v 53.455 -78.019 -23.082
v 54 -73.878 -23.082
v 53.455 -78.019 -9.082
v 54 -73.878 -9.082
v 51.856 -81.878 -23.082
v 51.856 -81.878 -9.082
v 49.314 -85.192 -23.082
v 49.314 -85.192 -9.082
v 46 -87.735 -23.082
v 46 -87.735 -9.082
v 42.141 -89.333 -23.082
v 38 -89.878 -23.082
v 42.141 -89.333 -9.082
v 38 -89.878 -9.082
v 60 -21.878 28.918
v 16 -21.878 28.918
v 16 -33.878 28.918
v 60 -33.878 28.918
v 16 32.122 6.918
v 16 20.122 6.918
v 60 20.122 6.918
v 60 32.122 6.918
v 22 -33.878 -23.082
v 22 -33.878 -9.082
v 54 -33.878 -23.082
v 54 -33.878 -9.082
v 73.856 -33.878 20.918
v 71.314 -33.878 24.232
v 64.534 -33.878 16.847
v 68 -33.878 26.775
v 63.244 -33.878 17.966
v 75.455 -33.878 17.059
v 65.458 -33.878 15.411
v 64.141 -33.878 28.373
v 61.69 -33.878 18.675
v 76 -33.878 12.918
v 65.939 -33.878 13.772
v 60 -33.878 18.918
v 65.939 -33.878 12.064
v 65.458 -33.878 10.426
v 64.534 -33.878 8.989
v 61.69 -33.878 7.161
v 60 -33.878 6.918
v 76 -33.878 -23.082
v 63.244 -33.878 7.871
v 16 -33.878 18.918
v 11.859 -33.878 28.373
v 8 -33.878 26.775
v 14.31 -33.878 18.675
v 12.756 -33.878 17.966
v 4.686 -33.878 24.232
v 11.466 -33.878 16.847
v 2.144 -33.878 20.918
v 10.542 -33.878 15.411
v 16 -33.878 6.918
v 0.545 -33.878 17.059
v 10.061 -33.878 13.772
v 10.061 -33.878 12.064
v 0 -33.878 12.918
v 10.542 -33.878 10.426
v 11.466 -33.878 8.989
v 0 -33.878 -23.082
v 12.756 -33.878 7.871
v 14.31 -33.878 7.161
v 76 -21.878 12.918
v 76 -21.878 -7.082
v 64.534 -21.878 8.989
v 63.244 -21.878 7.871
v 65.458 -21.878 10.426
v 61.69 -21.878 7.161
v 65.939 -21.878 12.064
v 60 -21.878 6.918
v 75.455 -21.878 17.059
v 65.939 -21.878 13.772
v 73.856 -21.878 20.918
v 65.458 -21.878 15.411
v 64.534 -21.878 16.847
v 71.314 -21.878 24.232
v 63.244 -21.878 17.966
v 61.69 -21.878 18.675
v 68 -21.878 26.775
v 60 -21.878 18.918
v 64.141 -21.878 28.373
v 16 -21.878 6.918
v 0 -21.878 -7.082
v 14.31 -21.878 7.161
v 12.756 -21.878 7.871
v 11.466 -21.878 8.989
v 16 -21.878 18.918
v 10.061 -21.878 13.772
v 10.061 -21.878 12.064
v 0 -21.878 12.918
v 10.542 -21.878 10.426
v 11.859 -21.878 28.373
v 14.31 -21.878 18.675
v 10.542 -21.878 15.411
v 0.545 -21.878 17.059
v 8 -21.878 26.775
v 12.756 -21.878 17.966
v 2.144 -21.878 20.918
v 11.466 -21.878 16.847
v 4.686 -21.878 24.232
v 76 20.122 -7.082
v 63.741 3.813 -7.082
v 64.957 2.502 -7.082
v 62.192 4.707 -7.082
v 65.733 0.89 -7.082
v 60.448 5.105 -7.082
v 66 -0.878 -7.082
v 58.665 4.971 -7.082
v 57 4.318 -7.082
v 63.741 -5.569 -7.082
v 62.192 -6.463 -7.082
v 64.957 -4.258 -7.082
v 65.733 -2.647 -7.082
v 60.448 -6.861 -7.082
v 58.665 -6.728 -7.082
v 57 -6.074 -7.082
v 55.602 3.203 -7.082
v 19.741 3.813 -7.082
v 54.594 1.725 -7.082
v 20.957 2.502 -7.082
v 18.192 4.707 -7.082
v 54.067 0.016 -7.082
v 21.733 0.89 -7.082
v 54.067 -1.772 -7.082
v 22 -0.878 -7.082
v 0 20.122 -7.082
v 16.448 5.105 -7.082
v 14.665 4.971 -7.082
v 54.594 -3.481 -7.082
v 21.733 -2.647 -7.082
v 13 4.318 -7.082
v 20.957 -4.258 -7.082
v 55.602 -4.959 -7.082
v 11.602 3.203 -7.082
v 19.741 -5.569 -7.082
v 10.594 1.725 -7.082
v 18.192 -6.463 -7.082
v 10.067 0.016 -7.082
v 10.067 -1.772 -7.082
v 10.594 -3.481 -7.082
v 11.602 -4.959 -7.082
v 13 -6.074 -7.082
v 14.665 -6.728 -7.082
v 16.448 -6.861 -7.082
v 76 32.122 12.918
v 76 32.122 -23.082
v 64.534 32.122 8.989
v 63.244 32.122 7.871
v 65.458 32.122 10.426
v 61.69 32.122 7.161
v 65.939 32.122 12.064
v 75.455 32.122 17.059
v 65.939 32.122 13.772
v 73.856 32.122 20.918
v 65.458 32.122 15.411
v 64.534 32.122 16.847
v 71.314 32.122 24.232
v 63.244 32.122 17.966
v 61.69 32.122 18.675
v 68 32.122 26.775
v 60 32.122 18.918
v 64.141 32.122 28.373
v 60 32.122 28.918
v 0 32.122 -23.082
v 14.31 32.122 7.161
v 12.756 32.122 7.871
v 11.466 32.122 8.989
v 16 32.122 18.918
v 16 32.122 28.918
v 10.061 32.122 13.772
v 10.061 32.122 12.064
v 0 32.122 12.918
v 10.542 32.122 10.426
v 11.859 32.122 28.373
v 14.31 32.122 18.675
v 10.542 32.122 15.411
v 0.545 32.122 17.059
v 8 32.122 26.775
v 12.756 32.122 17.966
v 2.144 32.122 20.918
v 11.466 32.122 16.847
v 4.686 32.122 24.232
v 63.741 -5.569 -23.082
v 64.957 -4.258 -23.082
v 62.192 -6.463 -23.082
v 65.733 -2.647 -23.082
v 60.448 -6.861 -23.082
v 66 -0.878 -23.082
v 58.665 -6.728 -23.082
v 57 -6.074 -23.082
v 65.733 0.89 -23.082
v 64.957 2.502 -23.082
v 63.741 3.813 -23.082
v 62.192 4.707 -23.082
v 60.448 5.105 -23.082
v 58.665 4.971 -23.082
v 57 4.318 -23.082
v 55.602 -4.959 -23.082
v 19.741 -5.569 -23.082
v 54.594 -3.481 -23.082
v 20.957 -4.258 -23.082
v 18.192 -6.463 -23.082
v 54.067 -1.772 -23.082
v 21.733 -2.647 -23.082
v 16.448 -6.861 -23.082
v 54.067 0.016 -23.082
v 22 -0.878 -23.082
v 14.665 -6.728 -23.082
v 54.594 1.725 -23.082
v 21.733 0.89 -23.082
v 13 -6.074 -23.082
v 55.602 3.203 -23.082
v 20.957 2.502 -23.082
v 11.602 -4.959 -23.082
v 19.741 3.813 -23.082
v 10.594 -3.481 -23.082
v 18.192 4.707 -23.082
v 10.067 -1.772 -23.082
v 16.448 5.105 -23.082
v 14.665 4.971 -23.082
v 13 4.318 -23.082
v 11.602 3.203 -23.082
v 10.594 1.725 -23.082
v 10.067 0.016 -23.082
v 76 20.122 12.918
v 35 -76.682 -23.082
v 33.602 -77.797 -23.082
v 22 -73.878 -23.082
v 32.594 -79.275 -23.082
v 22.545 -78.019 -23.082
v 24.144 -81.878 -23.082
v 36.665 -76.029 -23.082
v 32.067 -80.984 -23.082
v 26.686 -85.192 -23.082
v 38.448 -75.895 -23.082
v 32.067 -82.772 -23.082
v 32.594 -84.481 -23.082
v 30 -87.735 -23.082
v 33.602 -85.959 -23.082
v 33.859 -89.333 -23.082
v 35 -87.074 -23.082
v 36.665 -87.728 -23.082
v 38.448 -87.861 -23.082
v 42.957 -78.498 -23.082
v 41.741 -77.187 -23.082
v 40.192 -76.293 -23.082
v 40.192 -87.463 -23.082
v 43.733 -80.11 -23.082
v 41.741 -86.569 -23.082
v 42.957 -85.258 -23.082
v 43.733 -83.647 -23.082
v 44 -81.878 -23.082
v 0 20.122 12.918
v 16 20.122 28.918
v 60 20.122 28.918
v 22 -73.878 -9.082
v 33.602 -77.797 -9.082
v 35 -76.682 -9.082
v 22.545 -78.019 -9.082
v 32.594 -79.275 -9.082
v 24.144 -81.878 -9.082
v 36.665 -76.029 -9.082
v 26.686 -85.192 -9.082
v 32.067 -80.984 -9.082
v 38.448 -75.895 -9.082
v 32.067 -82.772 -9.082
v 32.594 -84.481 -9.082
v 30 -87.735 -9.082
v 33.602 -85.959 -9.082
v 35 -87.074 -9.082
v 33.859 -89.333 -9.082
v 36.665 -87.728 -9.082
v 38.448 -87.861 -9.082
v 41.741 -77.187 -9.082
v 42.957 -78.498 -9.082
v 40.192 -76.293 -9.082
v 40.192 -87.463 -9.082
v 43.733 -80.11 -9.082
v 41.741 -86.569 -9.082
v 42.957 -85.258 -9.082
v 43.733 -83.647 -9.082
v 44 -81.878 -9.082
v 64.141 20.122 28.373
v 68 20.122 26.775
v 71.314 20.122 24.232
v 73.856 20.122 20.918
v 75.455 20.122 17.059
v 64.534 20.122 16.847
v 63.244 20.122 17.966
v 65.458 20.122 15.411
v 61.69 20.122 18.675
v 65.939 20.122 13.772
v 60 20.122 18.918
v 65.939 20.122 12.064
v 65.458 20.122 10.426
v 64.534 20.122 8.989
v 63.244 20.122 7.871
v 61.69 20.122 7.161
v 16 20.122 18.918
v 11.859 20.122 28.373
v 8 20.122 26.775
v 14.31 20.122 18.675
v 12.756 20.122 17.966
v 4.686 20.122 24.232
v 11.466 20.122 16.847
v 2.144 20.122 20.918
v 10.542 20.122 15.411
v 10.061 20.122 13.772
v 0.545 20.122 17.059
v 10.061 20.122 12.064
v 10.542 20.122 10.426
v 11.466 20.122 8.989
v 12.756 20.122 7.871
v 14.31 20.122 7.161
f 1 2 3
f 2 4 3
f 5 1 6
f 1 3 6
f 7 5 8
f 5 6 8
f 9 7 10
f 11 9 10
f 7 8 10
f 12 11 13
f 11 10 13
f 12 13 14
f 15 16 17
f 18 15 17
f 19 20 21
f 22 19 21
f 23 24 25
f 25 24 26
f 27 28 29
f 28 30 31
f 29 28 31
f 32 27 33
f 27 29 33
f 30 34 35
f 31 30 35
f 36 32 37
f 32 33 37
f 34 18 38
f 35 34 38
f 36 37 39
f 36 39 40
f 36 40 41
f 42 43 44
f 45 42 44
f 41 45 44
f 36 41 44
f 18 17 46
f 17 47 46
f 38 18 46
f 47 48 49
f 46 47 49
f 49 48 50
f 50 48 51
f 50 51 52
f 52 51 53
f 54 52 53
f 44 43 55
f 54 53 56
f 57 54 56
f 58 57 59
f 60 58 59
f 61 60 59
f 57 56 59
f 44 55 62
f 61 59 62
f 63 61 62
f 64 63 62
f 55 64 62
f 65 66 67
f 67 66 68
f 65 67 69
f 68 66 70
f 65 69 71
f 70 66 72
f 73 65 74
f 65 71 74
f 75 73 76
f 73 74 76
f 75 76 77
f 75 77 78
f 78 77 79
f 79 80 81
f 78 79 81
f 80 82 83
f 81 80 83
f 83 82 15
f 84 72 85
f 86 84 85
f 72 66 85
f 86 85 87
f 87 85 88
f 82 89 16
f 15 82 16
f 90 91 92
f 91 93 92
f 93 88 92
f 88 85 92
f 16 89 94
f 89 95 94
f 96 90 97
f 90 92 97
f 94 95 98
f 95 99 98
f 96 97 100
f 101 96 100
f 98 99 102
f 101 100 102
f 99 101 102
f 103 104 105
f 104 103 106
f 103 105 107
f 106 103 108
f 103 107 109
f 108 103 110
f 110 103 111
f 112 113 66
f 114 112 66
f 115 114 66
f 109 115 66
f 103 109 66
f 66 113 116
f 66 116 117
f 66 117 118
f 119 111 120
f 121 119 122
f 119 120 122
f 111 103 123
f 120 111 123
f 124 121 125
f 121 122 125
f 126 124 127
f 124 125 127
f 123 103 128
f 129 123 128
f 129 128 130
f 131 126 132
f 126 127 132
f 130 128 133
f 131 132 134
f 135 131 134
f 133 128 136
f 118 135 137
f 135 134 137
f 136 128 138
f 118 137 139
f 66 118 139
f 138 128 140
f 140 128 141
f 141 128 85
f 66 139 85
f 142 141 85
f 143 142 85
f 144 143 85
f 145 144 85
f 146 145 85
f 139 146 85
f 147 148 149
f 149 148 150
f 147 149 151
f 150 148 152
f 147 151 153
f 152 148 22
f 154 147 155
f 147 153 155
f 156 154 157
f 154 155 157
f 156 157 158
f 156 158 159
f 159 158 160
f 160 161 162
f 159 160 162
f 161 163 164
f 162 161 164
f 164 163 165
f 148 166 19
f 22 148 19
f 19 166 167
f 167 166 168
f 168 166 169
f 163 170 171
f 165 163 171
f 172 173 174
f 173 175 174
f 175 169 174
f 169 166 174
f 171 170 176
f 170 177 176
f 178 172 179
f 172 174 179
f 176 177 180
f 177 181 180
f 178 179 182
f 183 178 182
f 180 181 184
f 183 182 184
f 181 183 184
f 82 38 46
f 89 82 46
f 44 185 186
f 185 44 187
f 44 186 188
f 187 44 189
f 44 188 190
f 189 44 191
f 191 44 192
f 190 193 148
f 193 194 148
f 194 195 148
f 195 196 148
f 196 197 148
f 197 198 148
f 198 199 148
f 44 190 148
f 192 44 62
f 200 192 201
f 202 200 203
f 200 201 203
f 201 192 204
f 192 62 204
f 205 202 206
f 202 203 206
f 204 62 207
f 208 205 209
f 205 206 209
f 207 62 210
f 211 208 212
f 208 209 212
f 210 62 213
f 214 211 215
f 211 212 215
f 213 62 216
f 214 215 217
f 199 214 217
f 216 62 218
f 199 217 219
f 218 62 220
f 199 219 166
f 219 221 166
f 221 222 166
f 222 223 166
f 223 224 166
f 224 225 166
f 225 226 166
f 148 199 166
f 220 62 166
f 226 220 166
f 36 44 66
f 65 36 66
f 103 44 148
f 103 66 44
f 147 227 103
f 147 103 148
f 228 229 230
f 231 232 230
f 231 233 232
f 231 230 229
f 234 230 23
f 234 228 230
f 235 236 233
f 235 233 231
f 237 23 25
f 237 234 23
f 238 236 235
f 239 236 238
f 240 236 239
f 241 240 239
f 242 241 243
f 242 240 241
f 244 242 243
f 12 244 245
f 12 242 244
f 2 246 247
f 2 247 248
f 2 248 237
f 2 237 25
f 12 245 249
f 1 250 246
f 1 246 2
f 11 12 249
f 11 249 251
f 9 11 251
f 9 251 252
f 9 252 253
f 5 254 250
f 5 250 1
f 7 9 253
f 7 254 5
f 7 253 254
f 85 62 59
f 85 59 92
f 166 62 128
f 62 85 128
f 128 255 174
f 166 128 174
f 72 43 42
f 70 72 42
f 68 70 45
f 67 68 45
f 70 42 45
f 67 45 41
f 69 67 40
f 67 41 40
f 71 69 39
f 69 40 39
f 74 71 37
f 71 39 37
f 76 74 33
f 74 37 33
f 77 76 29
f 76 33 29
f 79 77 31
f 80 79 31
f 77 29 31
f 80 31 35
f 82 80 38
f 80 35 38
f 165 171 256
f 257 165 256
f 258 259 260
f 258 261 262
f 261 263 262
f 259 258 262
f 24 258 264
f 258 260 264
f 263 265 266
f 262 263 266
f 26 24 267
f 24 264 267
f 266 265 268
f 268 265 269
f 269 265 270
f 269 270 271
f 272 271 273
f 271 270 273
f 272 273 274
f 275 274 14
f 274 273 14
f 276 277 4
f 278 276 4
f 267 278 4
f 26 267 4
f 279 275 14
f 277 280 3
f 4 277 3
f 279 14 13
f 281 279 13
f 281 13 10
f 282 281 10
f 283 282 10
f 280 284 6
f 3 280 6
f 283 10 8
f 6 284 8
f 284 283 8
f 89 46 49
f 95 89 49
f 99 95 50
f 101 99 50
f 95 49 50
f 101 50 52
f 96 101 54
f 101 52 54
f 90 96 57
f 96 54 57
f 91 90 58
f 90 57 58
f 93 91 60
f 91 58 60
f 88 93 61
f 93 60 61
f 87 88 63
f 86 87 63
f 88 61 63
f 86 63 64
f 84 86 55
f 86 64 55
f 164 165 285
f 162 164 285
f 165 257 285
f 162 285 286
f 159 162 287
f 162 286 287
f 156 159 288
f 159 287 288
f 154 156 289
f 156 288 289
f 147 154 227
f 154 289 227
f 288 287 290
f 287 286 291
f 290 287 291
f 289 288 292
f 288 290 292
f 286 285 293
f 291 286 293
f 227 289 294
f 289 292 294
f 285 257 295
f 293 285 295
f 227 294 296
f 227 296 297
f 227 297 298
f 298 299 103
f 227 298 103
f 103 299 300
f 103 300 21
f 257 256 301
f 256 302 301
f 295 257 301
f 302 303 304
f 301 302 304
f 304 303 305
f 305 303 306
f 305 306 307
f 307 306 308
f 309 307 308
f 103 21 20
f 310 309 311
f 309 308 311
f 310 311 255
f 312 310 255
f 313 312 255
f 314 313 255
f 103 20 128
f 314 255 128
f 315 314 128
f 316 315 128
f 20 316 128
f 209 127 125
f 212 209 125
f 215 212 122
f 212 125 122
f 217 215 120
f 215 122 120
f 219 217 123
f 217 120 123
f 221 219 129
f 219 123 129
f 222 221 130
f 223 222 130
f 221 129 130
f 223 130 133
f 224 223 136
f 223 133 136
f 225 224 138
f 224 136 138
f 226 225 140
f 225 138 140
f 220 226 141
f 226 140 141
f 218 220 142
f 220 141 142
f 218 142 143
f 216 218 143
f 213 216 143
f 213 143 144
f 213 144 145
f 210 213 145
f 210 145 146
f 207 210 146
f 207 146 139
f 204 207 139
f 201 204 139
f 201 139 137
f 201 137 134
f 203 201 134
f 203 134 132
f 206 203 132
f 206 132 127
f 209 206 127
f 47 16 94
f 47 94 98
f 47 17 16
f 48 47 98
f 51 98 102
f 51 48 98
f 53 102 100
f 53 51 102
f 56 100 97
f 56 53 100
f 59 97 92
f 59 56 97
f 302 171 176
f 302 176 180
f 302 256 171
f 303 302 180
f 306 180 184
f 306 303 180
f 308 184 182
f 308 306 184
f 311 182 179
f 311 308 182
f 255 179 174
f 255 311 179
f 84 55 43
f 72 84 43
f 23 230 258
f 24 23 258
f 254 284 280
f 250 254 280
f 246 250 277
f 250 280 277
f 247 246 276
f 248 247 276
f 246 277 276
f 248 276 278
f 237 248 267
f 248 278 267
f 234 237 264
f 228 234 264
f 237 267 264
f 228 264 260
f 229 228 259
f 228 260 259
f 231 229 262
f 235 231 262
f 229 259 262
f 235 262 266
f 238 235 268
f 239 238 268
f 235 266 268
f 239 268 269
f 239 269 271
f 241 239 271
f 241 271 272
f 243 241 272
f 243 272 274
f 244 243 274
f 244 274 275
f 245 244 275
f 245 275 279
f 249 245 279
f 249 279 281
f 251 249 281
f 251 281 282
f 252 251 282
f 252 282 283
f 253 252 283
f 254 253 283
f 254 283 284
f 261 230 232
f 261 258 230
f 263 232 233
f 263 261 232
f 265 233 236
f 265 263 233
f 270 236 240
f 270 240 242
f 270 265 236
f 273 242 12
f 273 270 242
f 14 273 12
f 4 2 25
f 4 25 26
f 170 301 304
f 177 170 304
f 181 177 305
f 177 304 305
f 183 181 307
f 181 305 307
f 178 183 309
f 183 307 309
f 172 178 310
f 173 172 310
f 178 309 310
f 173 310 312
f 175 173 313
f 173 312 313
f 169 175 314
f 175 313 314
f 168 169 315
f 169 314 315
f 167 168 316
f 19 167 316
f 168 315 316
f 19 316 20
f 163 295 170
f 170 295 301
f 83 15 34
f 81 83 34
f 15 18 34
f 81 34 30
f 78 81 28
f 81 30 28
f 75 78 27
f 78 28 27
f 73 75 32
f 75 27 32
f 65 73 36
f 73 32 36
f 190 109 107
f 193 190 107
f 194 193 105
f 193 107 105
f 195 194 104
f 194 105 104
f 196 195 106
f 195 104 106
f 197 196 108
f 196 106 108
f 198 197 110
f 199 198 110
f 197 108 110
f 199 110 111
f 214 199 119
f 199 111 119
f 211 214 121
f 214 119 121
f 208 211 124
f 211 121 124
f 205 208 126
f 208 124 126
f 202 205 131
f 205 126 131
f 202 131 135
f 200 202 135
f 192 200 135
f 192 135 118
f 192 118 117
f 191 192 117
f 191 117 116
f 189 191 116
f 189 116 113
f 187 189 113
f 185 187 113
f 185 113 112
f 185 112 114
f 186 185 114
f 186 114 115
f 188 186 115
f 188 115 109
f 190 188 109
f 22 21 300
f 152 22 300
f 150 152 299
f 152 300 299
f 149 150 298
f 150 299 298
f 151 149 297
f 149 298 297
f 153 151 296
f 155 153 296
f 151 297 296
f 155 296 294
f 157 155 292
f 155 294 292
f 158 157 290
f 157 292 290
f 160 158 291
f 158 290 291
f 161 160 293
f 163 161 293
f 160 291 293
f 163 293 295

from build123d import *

# Parameters (mm, degrees)
F1_DEPTH  = 76
F2_R      = 16
F4_DEPTH  = 66.001
F5_R      = 6
F6_DEPTH  = 16.001
F8_W      = 32
F8_H      = 14
F9_DEPTH  = 56
F11_R     = 15.99999
F10_R     = 6
F12_DEPTH = 14.001


# Not quite as in the source:
# - a fillet or chamfer is up to 0.001 mm smaller than in the source, because OpenCascade refuses the exact size


with BuildPart() as f1:
    # F0 (on Right) → F1 (new body)
    with BuildSketch(Plane.YZ):
        Polygon((-33.8781030774, 28.9183304161), (-33.8781030774, -23.0816695839), (32.1218969226, -23.0816695839), (32.1218969226, 28.9183304161), (20.1218969226, 28.9183304161), (20.1218969226, -7.0816695839), (-21.8781030774, -7.0816695839), (-21.8781030774, 28.9183304161), align=None)
    extrude(amount=F1_DEPTH)

    # F2
    f2_edges = [f1.edges().sort_by_distance(p)[0] for p in [
        (76, -27.878103, 28.91833),
        (76, 26.121897, 28.91833),
        (0, 26.121897, 28.91833),
        (0, -27.878103, 28.91833),
    ]]
    fillet(f2_edges, radius=F2_R)

    # F3 (on face) → F4 (cut, through all)
    with BuildSketch(Plane.XZ.offset(33.8781030774)):
        with BuildLine():
            Line((60, 18.9183304161), (16, 18.9183304161))
            ThreePointArc((16, 18.9183304161), (10, 12.9183304161), (16, 6.9183304161))
            Line((16, 6.9183304161), (60, 6.9183304161))
            ThreePointArc((60, 6.9183304161), (66, 12.9183304161), (60, 18.9183304161))
        make_face()
    extrude(amount=-F4_DEPTH, mode=Mode.SUBTRACT)

    # F5 (on face) → F6 (cut, through all)
    with BuildSketch(Plane.XY.offset(-7.0816695839)):
        with Locations((60, -0.8781030774)):
            Circle(F5_R)
        with Locations((16, -0.8781030774)):
            Circle(F5_R)
    extrude(amount=-F6_DEPTH, mode=Mode.SUBTRACT)


with BuildPart() as f9:
    # F8 (on offset) → F9 (new body)
    with BuildSketch(Plane.XZ.offset(89.8781030774)):
        with Locations((38, -16.0816695839)):
            Rectangle(F8_W, F8_H)
    extrude(amount=-F9_DEPTH)

    # F11 (radius 16 in the source; OpenCascade refuses exactly that, so slightly less here)
    f11_edges = [f9.edges().sort_by_distance(p)[0] for p in [
        (54, -89.878103, -16.08167),
        (22, -89.878103, -16.08167),
    ]]
    fillet(f11_edges, radius=F11_R)

    # F10 (on face) → F12 (cut, through all)
    with BuildSketch(Plane.XY.offset(-9.0816695839)):
        with Locations((38, -81.8781030774)):
            Circle(F10_R)
    extrude(amount=-F12_DEPTH, mode=Mode.SUBTRACT)


solid = Compound([f1.part, f9.part])
